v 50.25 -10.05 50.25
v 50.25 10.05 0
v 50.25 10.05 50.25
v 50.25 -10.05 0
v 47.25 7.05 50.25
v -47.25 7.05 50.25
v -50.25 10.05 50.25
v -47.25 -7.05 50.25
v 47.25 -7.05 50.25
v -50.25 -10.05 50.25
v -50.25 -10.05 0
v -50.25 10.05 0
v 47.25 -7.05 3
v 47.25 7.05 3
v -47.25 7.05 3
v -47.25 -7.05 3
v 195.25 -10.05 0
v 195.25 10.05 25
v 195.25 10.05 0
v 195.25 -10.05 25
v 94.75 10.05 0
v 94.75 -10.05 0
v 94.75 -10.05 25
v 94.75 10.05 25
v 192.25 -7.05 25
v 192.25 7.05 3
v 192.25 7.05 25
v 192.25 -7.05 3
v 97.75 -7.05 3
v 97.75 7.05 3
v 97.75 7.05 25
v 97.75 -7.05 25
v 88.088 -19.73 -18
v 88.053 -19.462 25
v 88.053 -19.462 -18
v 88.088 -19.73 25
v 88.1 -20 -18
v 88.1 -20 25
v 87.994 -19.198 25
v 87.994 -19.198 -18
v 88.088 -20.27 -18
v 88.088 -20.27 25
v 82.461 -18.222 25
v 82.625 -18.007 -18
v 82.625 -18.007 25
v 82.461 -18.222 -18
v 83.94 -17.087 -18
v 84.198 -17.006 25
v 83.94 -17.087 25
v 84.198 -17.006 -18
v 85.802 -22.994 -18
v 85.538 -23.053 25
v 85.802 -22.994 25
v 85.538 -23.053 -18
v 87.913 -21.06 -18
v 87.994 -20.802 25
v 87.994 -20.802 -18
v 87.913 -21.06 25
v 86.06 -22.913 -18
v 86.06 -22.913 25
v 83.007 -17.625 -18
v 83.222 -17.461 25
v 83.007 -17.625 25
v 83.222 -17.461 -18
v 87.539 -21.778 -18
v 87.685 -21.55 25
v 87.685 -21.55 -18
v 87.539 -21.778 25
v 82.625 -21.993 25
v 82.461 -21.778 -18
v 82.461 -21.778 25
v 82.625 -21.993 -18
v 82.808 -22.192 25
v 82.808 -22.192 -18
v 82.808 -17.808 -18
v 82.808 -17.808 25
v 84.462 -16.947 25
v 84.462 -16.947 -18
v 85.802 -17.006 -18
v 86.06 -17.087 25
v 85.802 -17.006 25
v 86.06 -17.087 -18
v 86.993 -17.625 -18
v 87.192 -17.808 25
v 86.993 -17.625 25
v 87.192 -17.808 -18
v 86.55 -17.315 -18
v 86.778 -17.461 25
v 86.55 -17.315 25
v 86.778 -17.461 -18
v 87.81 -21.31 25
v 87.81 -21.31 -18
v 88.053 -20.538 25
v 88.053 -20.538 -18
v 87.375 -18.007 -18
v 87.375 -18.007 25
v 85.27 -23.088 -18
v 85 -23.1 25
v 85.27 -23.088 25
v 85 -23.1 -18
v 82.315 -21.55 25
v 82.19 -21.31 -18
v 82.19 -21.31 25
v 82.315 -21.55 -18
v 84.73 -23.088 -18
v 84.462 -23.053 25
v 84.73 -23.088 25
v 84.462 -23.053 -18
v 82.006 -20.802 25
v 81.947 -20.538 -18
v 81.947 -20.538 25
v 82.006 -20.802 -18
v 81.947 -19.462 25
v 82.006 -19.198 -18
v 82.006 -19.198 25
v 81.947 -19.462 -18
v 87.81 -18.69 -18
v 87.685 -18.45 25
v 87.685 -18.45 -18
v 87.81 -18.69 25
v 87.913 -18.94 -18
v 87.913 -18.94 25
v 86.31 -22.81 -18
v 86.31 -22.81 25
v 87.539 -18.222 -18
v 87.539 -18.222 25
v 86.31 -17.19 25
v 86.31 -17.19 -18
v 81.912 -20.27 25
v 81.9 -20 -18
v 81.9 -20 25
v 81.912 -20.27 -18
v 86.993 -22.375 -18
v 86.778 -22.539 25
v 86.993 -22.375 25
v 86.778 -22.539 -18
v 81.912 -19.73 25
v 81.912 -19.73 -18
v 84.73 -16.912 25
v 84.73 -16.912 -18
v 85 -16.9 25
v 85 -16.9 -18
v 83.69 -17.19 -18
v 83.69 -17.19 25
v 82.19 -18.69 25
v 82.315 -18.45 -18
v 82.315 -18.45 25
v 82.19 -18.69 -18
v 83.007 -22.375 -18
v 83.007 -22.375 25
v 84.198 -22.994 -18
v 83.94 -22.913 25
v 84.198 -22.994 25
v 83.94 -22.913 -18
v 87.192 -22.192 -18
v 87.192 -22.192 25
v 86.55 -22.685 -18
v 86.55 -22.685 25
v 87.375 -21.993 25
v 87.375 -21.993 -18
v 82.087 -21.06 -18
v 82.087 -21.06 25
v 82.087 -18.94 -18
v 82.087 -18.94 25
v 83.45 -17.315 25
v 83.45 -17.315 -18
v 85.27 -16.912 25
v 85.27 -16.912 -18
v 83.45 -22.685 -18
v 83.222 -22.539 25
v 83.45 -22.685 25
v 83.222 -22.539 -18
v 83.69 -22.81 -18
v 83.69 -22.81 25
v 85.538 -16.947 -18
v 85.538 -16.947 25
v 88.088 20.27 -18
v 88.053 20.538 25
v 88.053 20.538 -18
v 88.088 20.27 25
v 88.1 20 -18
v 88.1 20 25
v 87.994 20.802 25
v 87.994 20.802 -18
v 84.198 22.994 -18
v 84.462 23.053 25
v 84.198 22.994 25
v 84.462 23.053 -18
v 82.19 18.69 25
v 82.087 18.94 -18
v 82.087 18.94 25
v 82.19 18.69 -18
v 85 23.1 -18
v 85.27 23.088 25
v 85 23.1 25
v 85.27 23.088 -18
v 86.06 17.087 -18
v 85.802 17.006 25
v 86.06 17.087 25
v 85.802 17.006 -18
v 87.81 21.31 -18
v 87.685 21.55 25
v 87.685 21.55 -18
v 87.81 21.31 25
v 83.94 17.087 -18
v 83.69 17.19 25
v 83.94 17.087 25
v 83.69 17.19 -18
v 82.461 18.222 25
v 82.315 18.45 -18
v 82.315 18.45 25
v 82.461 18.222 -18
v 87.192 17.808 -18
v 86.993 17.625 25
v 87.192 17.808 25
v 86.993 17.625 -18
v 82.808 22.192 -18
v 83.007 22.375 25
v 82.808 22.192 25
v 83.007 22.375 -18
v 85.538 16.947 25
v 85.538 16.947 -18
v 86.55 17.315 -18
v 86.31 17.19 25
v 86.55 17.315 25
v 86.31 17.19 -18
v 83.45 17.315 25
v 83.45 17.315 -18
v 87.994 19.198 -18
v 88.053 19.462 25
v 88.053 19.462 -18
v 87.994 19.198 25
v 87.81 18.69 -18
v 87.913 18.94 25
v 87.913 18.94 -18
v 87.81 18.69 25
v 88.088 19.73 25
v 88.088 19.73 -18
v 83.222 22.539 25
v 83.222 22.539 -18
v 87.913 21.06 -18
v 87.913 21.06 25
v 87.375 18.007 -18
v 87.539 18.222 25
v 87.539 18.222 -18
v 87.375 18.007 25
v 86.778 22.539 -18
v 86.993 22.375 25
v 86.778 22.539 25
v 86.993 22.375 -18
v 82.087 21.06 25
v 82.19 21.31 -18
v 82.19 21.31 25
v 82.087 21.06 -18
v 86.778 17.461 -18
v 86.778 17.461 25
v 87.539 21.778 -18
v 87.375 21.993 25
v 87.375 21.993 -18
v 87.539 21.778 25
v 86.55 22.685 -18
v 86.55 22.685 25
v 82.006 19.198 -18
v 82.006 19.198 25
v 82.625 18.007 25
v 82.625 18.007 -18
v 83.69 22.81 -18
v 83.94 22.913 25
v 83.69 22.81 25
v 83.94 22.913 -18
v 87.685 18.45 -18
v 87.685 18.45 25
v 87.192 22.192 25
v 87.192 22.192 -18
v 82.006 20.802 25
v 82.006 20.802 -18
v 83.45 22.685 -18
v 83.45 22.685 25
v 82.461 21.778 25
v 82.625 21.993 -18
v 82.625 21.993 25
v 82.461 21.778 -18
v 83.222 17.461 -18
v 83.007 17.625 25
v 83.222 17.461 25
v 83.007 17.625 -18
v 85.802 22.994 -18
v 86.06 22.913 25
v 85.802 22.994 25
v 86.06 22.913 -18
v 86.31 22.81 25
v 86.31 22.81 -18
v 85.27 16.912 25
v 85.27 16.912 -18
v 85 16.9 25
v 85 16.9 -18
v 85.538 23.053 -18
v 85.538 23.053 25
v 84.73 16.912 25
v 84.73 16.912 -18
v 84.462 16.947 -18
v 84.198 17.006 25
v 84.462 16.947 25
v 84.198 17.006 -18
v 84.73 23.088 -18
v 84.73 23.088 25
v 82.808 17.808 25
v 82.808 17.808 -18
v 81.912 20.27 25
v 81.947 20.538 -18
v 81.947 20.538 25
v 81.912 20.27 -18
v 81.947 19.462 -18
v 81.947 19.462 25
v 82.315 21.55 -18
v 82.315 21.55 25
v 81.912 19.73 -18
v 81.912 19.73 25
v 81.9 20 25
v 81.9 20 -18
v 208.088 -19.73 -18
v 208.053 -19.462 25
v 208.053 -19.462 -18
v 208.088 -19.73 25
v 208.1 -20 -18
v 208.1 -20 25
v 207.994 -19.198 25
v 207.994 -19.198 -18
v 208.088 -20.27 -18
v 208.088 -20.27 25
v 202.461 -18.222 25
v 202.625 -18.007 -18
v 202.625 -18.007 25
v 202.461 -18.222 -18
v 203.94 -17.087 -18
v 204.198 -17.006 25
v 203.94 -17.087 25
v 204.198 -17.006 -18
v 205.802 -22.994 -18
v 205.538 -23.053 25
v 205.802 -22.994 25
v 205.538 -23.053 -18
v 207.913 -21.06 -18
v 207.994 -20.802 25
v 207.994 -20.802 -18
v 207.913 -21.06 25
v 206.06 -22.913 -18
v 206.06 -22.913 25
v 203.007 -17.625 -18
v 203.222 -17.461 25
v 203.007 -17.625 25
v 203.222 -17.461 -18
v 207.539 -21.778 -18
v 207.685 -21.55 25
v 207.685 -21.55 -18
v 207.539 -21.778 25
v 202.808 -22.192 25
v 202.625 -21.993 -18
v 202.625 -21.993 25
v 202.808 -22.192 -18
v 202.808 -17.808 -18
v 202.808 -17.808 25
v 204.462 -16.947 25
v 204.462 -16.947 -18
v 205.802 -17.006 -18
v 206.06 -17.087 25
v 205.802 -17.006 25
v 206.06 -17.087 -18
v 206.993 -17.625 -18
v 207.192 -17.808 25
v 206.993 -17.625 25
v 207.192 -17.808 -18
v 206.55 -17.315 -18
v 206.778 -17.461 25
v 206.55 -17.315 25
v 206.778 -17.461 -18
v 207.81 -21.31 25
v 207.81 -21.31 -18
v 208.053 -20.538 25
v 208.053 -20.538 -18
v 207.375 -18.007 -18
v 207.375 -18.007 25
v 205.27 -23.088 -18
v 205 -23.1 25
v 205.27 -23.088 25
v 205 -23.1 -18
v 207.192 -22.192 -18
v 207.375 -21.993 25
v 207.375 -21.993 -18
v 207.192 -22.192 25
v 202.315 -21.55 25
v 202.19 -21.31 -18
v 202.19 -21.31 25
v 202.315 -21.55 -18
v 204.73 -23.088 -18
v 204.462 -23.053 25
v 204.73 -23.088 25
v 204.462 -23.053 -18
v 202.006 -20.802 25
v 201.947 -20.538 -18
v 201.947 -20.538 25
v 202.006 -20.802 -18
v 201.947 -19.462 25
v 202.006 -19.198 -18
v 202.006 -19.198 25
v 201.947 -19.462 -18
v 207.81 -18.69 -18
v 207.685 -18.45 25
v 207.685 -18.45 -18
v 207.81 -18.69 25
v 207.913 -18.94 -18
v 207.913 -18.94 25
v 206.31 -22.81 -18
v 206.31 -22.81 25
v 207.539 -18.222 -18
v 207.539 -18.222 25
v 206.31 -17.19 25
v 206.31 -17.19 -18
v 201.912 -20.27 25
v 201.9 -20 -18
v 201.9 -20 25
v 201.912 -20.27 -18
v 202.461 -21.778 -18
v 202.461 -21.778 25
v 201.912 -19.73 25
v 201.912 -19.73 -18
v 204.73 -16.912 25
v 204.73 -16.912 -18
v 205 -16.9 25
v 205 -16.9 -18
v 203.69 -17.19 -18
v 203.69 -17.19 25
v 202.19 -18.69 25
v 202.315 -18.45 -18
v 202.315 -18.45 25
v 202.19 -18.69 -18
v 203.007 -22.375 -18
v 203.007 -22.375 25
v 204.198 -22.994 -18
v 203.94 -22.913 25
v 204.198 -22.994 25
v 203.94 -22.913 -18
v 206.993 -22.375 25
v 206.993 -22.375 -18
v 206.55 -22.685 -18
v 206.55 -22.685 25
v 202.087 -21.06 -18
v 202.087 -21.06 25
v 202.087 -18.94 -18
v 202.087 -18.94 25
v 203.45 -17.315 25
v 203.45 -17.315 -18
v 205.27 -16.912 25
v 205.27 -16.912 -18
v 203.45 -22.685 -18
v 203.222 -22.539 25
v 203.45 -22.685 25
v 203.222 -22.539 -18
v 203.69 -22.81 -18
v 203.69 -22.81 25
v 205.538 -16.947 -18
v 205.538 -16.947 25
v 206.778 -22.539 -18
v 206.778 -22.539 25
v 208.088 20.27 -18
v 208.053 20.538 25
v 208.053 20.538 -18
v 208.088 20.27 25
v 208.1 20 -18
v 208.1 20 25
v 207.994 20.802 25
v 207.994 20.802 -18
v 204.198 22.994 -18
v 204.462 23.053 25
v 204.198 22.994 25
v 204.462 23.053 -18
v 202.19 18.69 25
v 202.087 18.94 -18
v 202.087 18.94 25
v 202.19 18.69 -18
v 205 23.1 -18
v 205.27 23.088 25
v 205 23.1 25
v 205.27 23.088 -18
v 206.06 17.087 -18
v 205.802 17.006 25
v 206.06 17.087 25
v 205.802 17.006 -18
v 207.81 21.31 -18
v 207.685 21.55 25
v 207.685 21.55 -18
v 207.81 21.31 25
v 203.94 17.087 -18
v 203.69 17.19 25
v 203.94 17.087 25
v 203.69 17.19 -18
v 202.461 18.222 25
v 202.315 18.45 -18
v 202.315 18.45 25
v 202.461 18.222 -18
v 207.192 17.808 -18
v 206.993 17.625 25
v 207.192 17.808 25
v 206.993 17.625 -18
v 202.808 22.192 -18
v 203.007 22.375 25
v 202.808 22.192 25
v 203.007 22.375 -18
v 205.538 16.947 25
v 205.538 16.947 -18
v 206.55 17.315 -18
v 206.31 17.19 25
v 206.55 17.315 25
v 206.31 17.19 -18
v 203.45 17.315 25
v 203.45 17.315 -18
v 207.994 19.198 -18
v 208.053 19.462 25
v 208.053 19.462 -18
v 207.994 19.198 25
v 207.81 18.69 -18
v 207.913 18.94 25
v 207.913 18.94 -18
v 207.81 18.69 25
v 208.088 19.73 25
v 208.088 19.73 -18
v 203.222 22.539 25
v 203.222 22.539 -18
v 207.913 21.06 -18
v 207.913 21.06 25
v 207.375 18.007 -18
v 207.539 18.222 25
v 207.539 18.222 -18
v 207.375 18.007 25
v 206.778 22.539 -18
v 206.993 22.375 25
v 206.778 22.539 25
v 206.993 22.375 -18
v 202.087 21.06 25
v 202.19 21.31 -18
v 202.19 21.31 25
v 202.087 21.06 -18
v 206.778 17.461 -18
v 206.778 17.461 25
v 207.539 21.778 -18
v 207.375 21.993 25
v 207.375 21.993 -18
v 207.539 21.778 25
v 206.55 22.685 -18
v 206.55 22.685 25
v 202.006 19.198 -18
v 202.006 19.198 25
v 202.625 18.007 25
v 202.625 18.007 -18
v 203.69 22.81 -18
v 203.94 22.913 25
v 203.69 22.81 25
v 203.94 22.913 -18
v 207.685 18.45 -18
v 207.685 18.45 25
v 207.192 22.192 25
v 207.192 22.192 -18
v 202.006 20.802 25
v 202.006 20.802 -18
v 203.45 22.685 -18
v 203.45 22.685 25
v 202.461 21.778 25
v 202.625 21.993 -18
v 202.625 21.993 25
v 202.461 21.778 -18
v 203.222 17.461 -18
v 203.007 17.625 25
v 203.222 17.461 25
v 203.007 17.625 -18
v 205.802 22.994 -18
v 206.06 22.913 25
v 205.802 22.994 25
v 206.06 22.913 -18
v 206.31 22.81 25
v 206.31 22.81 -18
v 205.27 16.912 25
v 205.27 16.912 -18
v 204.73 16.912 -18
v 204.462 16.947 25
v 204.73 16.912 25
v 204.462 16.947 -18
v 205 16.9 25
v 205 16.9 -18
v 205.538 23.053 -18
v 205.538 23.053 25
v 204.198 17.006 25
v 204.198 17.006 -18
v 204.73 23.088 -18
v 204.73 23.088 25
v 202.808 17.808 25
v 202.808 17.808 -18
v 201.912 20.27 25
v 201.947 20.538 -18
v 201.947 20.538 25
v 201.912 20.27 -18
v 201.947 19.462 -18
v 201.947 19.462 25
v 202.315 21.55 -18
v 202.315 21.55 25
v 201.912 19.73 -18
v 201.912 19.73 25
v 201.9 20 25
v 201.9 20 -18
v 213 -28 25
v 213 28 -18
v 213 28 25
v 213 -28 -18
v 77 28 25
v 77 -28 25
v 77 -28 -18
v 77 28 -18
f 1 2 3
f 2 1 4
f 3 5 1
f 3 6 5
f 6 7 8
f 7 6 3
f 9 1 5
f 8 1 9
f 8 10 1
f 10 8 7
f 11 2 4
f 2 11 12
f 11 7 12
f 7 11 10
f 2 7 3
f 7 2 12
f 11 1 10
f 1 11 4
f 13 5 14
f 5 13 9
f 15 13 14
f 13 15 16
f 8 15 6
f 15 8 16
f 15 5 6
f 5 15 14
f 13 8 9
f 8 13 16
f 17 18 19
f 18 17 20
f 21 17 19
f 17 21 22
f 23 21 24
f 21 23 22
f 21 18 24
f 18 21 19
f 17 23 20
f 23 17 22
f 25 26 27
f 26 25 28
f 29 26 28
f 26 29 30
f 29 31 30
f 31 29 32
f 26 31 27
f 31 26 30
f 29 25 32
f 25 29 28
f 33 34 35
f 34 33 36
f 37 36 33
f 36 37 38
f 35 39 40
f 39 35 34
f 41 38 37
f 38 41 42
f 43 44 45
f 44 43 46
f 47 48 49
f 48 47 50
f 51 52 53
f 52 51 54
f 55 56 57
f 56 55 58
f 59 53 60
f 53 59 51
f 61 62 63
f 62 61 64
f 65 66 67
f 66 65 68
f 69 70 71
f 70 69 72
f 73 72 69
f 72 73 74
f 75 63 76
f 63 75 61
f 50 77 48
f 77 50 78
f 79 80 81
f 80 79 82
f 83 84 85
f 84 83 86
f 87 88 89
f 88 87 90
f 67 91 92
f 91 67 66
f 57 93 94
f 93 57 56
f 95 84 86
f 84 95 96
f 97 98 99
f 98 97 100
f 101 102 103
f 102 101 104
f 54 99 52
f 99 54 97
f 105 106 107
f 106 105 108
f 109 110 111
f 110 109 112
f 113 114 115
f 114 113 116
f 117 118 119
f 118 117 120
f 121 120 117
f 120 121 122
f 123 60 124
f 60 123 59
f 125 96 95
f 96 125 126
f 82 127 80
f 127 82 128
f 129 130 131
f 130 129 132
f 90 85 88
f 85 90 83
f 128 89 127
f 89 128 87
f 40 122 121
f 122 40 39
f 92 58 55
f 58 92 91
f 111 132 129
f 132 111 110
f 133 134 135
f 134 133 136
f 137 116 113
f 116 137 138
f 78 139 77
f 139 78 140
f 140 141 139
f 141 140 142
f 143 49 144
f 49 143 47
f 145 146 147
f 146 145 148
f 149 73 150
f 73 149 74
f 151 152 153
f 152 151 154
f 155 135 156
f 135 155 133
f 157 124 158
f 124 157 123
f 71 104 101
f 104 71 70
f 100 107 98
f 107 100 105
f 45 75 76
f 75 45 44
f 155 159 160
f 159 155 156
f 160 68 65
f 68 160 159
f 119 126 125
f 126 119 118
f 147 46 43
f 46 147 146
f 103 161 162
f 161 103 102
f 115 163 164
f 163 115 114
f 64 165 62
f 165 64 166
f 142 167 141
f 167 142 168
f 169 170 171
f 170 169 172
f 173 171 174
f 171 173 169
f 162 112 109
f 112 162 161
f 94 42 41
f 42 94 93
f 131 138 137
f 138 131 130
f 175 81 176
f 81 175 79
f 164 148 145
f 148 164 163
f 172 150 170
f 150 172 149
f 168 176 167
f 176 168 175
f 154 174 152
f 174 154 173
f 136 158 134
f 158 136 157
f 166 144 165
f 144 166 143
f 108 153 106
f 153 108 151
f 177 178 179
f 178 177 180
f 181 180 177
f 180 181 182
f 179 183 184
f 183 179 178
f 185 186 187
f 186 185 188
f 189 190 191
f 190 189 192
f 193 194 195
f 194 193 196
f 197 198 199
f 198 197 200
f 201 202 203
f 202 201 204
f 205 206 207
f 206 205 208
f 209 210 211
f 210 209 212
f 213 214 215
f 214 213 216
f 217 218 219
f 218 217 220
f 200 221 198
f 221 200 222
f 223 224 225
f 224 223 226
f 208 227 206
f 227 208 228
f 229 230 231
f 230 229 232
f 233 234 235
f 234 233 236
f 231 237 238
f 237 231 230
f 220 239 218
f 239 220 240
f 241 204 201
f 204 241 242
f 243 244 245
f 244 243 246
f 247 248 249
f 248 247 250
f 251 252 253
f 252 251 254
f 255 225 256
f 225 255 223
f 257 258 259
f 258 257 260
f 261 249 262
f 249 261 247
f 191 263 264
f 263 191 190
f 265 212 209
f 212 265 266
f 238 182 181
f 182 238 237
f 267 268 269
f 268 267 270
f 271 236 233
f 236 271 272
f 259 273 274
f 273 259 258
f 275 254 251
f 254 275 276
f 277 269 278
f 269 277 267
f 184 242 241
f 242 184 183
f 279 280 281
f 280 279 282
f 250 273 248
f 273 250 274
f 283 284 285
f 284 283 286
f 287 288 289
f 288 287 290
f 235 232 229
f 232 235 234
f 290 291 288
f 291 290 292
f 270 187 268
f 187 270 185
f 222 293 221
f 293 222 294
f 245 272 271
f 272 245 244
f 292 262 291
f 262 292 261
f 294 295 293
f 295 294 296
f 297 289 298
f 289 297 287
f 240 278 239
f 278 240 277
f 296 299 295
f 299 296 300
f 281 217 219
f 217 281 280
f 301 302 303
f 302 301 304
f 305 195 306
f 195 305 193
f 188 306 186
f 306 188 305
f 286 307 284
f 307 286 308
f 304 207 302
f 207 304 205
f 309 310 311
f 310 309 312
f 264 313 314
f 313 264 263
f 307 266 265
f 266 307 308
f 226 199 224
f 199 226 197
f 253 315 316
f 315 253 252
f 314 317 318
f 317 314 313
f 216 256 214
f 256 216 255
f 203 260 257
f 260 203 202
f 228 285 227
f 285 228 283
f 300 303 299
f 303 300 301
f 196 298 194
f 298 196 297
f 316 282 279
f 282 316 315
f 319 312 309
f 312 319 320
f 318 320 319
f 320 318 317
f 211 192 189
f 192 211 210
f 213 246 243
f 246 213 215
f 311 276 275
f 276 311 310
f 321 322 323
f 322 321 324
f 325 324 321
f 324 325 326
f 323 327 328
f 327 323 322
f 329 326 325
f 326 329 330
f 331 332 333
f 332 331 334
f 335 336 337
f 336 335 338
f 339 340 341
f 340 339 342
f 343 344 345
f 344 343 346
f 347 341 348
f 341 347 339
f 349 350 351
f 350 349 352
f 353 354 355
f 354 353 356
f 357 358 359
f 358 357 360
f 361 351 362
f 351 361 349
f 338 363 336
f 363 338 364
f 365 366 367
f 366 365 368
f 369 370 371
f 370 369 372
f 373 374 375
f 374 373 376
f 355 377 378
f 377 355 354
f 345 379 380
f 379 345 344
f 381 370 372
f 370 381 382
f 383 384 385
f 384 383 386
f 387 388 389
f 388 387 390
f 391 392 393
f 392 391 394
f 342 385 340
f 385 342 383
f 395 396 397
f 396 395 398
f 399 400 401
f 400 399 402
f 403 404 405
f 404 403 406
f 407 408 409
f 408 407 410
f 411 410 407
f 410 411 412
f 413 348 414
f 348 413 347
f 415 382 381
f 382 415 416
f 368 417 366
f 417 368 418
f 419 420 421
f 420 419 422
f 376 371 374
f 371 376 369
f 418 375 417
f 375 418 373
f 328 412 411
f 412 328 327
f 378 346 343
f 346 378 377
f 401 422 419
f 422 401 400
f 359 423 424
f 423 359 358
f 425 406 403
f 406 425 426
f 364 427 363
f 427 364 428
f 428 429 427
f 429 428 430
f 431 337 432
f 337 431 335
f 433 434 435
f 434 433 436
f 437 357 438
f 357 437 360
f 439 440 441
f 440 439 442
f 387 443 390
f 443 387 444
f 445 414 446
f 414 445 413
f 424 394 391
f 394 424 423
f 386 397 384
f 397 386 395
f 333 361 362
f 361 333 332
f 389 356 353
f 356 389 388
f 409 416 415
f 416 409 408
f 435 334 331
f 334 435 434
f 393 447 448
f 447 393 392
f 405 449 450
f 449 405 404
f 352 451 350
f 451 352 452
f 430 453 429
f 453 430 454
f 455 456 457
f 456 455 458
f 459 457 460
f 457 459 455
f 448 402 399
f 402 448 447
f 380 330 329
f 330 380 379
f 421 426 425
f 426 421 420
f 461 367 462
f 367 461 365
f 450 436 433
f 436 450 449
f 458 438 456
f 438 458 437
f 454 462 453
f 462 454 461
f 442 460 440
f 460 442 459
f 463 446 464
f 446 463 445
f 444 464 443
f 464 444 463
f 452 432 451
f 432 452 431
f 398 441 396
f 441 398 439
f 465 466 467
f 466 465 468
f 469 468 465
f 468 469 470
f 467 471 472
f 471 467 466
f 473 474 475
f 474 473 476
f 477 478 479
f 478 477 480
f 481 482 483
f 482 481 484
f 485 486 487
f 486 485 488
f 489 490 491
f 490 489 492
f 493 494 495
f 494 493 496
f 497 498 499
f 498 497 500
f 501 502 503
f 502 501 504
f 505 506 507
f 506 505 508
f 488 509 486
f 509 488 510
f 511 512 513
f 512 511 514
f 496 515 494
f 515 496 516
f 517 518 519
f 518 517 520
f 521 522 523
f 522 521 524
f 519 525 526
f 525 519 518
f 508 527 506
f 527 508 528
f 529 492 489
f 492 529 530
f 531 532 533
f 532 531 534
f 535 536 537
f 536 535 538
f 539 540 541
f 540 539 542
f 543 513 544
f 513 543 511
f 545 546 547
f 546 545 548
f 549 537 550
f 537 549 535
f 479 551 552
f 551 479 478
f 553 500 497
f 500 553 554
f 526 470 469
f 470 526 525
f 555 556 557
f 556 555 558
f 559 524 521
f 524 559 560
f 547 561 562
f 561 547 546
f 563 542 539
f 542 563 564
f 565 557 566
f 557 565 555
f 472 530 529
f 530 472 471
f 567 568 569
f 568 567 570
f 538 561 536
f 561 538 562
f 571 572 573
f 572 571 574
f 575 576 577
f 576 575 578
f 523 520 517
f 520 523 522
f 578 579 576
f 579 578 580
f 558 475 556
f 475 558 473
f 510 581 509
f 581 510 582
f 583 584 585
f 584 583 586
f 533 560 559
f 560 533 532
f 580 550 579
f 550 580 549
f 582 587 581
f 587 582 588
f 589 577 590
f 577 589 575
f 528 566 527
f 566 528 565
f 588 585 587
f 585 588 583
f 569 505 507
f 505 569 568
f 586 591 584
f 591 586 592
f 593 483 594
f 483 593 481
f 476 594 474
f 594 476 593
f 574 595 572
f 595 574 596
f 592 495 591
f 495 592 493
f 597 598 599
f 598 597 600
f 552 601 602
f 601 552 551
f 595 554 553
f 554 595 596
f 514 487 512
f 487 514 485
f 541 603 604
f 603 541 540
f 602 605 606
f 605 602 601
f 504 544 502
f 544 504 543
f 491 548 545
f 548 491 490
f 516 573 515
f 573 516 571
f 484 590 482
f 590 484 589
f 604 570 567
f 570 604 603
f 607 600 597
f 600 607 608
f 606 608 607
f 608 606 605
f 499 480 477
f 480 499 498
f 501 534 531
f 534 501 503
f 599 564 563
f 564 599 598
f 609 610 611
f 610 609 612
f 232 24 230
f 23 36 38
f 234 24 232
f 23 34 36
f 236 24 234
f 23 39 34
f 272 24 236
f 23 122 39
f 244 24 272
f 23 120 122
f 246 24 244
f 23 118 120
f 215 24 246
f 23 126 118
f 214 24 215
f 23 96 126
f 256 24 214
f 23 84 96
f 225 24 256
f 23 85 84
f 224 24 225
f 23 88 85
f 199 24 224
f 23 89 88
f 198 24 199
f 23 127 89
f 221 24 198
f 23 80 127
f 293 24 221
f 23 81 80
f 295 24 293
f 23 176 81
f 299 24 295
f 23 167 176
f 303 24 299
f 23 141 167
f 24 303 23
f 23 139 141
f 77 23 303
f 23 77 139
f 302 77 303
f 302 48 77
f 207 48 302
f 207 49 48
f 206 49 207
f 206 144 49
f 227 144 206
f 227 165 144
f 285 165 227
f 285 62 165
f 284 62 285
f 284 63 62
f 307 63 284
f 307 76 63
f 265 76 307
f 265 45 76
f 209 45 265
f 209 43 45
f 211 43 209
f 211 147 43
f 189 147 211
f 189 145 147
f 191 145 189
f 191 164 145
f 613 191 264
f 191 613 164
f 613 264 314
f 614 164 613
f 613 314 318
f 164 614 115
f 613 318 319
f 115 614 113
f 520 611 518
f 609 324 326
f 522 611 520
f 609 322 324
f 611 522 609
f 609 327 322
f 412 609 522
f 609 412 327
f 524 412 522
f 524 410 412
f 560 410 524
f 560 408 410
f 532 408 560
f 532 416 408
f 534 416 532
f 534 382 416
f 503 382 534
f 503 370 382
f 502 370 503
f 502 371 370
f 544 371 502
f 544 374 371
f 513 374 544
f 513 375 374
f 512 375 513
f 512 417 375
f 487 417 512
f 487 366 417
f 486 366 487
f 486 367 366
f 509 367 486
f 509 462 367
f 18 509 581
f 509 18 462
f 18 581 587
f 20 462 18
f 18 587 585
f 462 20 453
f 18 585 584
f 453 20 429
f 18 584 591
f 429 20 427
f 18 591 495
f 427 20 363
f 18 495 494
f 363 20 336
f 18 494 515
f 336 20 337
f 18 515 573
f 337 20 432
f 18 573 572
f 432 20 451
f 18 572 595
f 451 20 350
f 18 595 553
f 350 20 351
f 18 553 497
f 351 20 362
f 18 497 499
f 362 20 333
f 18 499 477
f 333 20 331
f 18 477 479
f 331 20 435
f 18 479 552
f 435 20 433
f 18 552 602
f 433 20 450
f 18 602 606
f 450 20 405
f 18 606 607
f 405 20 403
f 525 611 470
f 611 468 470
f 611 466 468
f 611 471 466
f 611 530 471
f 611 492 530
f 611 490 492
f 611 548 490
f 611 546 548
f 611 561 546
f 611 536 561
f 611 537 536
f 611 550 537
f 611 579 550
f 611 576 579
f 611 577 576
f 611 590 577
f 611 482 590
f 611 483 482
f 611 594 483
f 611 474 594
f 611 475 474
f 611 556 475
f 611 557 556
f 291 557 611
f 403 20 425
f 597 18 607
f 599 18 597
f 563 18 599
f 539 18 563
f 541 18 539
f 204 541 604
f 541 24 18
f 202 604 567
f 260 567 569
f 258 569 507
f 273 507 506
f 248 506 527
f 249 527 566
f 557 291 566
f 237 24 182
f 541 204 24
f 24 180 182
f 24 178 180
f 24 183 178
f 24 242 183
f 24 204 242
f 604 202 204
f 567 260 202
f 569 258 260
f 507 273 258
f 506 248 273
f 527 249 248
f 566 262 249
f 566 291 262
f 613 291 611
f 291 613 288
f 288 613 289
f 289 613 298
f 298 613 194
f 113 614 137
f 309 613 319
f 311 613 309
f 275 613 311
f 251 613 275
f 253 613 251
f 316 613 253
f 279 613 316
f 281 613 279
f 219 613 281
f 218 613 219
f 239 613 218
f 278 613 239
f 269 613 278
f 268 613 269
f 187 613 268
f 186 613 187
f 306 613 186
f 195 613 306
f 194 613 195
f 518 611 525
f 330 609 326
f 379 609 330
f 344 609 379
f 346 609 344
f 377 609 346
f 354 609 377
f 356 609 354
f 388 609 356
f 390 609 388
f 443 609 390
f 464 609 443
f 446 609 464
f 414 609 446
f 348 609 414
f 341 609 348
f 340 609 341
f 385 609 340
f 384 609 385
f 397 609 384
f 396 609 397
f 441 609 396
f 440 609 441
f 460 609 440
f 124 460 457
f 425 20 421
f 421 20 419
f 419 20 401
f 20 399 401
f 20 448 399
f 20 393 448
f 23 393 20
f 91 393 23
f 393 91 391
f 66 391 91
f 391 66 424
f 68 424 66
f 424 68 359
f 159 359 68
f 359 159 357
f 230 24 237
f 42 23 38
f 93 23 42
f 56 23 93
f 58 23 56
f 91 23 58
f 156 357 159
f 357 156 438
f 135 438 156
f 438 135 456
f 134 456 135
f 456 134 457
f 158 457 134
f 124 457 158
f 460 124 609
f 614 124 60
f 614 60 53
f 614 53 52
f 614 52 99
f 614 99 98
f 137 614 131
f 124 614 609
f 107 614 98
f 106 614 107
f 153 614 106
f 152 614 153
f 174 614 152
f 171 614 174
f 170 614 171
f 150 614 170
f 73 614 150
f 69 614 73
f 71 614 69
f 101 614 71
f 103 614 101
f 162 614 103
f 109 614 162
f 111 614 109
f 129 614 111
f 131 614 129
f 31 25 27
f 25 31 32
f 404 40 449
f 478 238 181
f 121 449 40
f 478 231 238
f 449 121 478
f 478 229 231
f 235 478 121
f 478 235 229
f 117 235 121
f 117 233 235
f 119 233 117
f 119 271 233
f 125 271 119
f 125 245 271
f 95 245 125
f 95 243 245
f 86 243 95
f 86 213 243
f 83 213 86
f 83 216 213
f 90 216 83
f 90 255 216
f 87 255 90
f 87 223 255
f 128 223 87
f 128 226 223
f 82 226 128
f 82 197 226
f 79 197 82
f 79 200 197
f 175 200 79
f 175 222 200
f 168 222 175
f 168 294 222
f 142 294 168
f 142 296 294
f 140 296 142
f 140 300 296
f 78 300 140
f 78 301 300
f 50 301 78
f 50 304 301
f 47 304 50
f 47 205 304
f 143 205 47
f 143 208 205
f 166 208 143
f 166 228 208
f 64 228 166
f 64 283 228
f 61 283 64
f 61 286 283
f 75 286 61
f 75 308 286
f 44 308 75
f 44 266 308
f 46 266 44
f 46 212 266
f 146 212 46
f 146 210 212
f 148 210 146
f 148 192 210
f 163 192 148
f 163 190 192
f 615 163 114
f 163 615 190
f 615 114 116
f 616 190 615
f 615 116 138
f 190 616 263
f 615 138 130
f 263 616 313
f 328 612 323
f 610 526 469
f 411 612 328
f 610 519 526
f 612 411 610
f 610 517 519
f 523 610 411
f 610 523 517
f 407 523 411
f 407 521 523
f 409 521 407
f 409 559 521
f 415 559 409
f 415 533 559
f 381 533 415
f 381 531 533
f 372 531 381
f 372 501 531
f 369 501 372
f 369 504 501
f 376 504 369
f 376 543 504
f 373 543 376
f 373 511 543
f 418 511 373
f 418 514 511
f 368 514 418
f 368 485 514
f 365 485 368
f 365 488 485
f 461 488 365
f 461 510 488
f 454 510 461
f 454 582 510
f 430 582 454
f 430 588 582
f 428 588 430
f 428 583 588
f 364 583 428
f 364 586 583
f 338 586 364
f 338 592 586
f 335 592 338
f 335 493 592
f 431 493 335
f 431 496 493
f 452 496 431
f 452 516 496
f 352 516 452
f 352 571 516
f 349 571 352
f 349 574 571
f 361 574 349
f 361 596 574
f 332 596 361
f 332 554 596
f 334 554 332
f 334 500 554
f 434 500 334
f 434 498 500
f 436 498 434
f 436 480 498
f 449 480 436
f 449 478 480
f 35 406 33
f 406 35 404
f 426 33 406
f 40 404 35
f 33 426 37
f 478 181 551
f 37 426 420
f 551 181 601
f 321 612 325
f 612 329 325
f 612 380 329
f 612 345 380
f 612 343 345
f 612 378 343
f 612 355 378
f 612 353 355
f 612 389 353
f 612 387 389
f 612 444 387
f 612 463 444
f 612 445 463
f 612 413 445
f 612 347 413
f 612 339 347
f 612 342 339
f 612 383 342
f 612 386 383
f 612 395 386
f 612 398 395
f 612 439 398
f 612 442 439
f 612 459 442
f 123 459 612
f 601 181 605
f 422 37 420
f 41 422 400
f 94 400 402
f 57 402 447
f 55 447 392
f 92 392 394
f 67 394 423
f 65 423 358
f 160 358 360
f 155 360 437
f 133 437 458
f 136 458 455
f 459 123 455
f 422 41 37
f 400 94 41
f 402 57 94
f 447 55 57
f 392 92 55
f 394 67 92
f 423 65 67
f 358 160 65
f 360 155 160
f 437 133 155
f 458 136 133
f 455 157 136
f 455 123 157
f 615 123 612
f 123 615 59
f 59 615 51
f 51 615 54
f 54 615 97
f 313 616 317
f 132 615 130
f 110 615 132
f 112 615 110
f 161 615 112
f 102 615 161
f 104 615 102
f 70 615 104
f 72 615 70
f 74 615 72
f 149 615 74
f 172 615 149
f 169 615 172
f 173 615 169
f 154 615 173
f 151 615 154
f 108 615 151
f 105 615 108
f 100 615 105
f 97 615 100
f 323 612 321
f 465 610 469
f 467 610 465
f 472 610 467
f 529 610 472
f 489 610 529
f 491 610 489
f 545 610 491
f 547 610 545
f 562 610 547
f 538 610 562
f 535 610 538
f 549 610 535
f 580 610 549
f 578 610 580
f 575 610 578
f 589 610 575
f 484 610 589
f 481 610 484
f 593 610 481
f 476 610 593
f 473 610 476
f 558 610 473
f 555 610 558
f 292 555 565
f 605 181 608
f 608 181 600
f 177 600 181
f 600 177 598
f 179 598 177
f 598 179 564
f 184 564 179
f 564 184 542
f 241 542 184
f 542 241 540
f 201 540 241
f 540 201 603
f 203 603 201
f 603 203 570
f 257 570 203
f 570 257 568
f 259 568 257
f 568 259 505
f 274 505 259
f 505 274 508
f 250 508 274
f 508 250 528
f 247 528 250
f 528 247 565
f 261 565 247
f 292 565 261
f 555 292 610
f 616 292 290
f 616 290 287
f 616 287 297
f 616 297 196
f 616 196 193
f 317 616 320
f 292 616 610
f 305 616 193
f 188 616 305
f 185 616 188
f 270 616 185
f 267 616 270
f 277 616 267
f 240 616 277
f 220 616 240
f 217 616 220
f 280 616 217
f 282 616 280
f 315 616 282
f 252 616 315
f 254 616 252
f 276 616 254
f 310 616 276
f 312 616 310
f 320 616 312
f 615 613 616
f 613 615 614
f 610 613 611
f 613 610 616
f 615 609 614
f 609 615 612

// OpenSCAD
// ChronicleRAG & InsightChat — Parametric Millimetric CAD & Mold Generator (.scad)
// Change any variable below in millimeters (mm) — holes, wall thickness, and mold cavity update automatically!

width_mm          = 100.0;
height_mm         = 20.0;
depth_mm          = 50.0;
wall_thickness_mm = 3.0;
hole_diameter_mm  = 4.2;   // e.g. 3.2mm for M3 clearance, 2.5mm for M3 self-tap
hole_pitch_x_mm   = 136.0;
hole_pitch_y_mm   = 216.0;
fit_tolerance_mm  = 0.2;
mold_draft_deg    = 2.0;
mold_shrink_pct   = 0.5;
render_mode       = "part_and_mold"; // "part_only" | "mold_cavity_and_core" | "part_and_mold"

$fn = 72; // High circular hole accuracy

module precision_part() {
    scale_f = 1.0 + (mold_shrink_pct / 100.0);
    W = width_mm * scale_f;
    H = height_mm * scale_f;
    D = depth_mm * scale_f;
    d_hole = hole_diameter_mm + fit_tolerance_mm;

    difference() {
        // Outer shell
        translate([-W/2, -H/2, 0])
            cube([W, H, D]);

        // Inner cavity
        translate([-(W/2) + wall_thickness_mm, -(H/2) + wall_thickness_mm, wall_thickness_mm])
            cube([W - 2*wall_thickness_mm, H - 2*wall_thickness_mm, D + 1.0]);

        // 4 Precision Mounting Holes
        for (sx = [-1, 1]) {
            for (sy = [-1, 1]) {
                translate([sx * (hole_pitch_x_mm / 2), sy * (hole_pitch_y_mm / 2), -1.0])
                    cylinder(h = D + 2.0, d = d_hole);
            }
        }
    }
}

module injection_mold_lower_cavity() {
    margin = 18.0;
    W_mold = width_mm + 2 * margin;
    H_mold = height_mm + 2 * margin;
    D_mold = (depth_mm / 2) + margin;
    difference() {
        translate([-W_mold/2, -H_mold/2, -margin])
            cube([W_mold, H_mold, D_mold]);
        precision_part();
        // 4 Mold Registration Alignment Dowel Pins (6.0 mm)
        for (sx = [-1, 1])
            for (sy = [-1, 1])
                translate([sx * (W_mold/2 - 8), sy * (H_mold/2 - 8), -margin - 1])
                    cylinder(h = D_mold + 2, d = 6.0 + fit_tolerance_mm);
    }
}

if (render_mode == "part_only") {
    precision_part();
} else if (render_mode == "mold_cavity_and_core") {
    injection_mold_lower_cavity();
} else {
    precision_part();
    translate([width_mm + 45, 0, 0])
        injection_mold_lower_cavity();
}
